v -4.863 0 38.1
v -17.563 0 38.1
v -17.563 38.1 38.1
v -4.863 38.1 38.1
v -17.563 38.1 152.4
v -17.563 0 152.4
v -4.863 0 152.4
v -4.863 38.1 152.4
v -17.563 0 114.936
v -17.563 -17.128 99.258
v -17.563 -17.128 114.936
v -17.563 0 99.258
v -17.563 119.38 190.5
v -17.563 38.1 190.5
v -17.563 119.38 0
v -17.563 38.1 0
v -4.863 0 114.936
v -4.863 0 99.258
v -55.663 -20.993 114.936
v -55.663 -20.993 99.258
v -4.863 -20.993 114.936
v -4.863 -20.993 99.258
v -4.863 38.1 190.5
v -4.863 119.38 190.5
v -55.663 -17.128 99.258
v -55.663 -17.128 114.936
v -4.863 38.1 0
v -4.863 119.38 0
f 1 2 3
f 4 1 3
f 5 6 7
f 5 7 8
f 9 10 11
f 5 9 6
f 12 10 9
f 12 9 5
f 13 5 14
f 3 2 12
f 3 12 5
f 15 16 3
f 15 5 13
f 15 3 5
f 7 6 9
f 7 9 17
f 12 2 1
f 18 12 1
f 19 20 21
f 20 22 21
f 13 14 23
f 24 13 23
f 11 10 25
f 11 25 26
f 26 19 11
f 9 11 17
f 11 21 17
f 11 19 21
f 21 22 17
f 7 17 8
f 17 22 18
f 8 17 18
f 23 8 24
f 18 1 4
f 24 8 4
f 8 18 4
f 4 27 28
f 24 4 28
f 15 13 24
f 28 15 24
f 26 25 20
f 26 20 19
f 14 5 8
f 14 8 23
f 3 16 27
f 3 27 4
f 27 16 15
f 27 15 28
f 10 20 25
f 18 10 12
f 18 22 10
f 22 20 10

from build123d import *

# Parameters (mm, degrees)
SKETCH1_W           = 12.7
SKETCH1_H           = 119.38
BOSS_EXTRUDE1_DEPTH = 190.5
SKETCH2_W           = 38.1
SKETCH2_H           = 38.1
CUT_EXTRUDE1_DEPTH  = 226.173542851
SKETCH3_W           = 12.7
SKETCH3_H           = 15.677565112
BOSS_EXTRUDE2_DEPTH = 20.9926
SKETCH4_W           = 15.677565112
SKETCH4_H           = 3.864411614
BOSS_EXTRUDE3_DEPTH = 38.1


with BuildPart() as part:
    # Sketch1 → Boss-Extrude1 (new body)
    with BuildSketch(Plane.XY):
        with Locations((-11.213311432, 59.69)):
            Rectangle(SKETCH1_W, SKETCH1_H)
    extrude(amount=BOSS_EXTRUDE1_DEPTH)

    # Sketch2 → Cut-Extrude1 (cut, through all)
    with BuildSketch(Plane.ZY.offset(17.563311432)):
        with Locations((171.45, 19.05)):
            Rectangle(SKETCH2_W, SKETCH2_H)
        with Locations((19.05, 19.05)):
            Rectangle(SKETCH2_W, SKETCH2_H)
    extrude(amount=-CUT_EXTRUDE1_DEPTH, mode=Mode.SUBTRACT)

    # Sketch3 → Boss-Extrude2 (add)
    with BuildSketch(Plane.XZ):
        with Locations((-11.213311432, 107.097101601)):
            Rectangle(SKETCH3_W, SKETCH3_H)
    extrude(amount=BOSS_EXTRUDE2_DEPTH)

    # Sketch4 → Boss-Extrude3 (add)
    with BuildSketch(Plane.ZY.offset(17.563311432)):
        with Locations((107.097101601, -19.060394193)):
            Rectangle(SKETCH4_W, SKETCH4_H)
    extrude(amount=BOSS_EXTRUDE3_DEPTH)


solid = part.part
